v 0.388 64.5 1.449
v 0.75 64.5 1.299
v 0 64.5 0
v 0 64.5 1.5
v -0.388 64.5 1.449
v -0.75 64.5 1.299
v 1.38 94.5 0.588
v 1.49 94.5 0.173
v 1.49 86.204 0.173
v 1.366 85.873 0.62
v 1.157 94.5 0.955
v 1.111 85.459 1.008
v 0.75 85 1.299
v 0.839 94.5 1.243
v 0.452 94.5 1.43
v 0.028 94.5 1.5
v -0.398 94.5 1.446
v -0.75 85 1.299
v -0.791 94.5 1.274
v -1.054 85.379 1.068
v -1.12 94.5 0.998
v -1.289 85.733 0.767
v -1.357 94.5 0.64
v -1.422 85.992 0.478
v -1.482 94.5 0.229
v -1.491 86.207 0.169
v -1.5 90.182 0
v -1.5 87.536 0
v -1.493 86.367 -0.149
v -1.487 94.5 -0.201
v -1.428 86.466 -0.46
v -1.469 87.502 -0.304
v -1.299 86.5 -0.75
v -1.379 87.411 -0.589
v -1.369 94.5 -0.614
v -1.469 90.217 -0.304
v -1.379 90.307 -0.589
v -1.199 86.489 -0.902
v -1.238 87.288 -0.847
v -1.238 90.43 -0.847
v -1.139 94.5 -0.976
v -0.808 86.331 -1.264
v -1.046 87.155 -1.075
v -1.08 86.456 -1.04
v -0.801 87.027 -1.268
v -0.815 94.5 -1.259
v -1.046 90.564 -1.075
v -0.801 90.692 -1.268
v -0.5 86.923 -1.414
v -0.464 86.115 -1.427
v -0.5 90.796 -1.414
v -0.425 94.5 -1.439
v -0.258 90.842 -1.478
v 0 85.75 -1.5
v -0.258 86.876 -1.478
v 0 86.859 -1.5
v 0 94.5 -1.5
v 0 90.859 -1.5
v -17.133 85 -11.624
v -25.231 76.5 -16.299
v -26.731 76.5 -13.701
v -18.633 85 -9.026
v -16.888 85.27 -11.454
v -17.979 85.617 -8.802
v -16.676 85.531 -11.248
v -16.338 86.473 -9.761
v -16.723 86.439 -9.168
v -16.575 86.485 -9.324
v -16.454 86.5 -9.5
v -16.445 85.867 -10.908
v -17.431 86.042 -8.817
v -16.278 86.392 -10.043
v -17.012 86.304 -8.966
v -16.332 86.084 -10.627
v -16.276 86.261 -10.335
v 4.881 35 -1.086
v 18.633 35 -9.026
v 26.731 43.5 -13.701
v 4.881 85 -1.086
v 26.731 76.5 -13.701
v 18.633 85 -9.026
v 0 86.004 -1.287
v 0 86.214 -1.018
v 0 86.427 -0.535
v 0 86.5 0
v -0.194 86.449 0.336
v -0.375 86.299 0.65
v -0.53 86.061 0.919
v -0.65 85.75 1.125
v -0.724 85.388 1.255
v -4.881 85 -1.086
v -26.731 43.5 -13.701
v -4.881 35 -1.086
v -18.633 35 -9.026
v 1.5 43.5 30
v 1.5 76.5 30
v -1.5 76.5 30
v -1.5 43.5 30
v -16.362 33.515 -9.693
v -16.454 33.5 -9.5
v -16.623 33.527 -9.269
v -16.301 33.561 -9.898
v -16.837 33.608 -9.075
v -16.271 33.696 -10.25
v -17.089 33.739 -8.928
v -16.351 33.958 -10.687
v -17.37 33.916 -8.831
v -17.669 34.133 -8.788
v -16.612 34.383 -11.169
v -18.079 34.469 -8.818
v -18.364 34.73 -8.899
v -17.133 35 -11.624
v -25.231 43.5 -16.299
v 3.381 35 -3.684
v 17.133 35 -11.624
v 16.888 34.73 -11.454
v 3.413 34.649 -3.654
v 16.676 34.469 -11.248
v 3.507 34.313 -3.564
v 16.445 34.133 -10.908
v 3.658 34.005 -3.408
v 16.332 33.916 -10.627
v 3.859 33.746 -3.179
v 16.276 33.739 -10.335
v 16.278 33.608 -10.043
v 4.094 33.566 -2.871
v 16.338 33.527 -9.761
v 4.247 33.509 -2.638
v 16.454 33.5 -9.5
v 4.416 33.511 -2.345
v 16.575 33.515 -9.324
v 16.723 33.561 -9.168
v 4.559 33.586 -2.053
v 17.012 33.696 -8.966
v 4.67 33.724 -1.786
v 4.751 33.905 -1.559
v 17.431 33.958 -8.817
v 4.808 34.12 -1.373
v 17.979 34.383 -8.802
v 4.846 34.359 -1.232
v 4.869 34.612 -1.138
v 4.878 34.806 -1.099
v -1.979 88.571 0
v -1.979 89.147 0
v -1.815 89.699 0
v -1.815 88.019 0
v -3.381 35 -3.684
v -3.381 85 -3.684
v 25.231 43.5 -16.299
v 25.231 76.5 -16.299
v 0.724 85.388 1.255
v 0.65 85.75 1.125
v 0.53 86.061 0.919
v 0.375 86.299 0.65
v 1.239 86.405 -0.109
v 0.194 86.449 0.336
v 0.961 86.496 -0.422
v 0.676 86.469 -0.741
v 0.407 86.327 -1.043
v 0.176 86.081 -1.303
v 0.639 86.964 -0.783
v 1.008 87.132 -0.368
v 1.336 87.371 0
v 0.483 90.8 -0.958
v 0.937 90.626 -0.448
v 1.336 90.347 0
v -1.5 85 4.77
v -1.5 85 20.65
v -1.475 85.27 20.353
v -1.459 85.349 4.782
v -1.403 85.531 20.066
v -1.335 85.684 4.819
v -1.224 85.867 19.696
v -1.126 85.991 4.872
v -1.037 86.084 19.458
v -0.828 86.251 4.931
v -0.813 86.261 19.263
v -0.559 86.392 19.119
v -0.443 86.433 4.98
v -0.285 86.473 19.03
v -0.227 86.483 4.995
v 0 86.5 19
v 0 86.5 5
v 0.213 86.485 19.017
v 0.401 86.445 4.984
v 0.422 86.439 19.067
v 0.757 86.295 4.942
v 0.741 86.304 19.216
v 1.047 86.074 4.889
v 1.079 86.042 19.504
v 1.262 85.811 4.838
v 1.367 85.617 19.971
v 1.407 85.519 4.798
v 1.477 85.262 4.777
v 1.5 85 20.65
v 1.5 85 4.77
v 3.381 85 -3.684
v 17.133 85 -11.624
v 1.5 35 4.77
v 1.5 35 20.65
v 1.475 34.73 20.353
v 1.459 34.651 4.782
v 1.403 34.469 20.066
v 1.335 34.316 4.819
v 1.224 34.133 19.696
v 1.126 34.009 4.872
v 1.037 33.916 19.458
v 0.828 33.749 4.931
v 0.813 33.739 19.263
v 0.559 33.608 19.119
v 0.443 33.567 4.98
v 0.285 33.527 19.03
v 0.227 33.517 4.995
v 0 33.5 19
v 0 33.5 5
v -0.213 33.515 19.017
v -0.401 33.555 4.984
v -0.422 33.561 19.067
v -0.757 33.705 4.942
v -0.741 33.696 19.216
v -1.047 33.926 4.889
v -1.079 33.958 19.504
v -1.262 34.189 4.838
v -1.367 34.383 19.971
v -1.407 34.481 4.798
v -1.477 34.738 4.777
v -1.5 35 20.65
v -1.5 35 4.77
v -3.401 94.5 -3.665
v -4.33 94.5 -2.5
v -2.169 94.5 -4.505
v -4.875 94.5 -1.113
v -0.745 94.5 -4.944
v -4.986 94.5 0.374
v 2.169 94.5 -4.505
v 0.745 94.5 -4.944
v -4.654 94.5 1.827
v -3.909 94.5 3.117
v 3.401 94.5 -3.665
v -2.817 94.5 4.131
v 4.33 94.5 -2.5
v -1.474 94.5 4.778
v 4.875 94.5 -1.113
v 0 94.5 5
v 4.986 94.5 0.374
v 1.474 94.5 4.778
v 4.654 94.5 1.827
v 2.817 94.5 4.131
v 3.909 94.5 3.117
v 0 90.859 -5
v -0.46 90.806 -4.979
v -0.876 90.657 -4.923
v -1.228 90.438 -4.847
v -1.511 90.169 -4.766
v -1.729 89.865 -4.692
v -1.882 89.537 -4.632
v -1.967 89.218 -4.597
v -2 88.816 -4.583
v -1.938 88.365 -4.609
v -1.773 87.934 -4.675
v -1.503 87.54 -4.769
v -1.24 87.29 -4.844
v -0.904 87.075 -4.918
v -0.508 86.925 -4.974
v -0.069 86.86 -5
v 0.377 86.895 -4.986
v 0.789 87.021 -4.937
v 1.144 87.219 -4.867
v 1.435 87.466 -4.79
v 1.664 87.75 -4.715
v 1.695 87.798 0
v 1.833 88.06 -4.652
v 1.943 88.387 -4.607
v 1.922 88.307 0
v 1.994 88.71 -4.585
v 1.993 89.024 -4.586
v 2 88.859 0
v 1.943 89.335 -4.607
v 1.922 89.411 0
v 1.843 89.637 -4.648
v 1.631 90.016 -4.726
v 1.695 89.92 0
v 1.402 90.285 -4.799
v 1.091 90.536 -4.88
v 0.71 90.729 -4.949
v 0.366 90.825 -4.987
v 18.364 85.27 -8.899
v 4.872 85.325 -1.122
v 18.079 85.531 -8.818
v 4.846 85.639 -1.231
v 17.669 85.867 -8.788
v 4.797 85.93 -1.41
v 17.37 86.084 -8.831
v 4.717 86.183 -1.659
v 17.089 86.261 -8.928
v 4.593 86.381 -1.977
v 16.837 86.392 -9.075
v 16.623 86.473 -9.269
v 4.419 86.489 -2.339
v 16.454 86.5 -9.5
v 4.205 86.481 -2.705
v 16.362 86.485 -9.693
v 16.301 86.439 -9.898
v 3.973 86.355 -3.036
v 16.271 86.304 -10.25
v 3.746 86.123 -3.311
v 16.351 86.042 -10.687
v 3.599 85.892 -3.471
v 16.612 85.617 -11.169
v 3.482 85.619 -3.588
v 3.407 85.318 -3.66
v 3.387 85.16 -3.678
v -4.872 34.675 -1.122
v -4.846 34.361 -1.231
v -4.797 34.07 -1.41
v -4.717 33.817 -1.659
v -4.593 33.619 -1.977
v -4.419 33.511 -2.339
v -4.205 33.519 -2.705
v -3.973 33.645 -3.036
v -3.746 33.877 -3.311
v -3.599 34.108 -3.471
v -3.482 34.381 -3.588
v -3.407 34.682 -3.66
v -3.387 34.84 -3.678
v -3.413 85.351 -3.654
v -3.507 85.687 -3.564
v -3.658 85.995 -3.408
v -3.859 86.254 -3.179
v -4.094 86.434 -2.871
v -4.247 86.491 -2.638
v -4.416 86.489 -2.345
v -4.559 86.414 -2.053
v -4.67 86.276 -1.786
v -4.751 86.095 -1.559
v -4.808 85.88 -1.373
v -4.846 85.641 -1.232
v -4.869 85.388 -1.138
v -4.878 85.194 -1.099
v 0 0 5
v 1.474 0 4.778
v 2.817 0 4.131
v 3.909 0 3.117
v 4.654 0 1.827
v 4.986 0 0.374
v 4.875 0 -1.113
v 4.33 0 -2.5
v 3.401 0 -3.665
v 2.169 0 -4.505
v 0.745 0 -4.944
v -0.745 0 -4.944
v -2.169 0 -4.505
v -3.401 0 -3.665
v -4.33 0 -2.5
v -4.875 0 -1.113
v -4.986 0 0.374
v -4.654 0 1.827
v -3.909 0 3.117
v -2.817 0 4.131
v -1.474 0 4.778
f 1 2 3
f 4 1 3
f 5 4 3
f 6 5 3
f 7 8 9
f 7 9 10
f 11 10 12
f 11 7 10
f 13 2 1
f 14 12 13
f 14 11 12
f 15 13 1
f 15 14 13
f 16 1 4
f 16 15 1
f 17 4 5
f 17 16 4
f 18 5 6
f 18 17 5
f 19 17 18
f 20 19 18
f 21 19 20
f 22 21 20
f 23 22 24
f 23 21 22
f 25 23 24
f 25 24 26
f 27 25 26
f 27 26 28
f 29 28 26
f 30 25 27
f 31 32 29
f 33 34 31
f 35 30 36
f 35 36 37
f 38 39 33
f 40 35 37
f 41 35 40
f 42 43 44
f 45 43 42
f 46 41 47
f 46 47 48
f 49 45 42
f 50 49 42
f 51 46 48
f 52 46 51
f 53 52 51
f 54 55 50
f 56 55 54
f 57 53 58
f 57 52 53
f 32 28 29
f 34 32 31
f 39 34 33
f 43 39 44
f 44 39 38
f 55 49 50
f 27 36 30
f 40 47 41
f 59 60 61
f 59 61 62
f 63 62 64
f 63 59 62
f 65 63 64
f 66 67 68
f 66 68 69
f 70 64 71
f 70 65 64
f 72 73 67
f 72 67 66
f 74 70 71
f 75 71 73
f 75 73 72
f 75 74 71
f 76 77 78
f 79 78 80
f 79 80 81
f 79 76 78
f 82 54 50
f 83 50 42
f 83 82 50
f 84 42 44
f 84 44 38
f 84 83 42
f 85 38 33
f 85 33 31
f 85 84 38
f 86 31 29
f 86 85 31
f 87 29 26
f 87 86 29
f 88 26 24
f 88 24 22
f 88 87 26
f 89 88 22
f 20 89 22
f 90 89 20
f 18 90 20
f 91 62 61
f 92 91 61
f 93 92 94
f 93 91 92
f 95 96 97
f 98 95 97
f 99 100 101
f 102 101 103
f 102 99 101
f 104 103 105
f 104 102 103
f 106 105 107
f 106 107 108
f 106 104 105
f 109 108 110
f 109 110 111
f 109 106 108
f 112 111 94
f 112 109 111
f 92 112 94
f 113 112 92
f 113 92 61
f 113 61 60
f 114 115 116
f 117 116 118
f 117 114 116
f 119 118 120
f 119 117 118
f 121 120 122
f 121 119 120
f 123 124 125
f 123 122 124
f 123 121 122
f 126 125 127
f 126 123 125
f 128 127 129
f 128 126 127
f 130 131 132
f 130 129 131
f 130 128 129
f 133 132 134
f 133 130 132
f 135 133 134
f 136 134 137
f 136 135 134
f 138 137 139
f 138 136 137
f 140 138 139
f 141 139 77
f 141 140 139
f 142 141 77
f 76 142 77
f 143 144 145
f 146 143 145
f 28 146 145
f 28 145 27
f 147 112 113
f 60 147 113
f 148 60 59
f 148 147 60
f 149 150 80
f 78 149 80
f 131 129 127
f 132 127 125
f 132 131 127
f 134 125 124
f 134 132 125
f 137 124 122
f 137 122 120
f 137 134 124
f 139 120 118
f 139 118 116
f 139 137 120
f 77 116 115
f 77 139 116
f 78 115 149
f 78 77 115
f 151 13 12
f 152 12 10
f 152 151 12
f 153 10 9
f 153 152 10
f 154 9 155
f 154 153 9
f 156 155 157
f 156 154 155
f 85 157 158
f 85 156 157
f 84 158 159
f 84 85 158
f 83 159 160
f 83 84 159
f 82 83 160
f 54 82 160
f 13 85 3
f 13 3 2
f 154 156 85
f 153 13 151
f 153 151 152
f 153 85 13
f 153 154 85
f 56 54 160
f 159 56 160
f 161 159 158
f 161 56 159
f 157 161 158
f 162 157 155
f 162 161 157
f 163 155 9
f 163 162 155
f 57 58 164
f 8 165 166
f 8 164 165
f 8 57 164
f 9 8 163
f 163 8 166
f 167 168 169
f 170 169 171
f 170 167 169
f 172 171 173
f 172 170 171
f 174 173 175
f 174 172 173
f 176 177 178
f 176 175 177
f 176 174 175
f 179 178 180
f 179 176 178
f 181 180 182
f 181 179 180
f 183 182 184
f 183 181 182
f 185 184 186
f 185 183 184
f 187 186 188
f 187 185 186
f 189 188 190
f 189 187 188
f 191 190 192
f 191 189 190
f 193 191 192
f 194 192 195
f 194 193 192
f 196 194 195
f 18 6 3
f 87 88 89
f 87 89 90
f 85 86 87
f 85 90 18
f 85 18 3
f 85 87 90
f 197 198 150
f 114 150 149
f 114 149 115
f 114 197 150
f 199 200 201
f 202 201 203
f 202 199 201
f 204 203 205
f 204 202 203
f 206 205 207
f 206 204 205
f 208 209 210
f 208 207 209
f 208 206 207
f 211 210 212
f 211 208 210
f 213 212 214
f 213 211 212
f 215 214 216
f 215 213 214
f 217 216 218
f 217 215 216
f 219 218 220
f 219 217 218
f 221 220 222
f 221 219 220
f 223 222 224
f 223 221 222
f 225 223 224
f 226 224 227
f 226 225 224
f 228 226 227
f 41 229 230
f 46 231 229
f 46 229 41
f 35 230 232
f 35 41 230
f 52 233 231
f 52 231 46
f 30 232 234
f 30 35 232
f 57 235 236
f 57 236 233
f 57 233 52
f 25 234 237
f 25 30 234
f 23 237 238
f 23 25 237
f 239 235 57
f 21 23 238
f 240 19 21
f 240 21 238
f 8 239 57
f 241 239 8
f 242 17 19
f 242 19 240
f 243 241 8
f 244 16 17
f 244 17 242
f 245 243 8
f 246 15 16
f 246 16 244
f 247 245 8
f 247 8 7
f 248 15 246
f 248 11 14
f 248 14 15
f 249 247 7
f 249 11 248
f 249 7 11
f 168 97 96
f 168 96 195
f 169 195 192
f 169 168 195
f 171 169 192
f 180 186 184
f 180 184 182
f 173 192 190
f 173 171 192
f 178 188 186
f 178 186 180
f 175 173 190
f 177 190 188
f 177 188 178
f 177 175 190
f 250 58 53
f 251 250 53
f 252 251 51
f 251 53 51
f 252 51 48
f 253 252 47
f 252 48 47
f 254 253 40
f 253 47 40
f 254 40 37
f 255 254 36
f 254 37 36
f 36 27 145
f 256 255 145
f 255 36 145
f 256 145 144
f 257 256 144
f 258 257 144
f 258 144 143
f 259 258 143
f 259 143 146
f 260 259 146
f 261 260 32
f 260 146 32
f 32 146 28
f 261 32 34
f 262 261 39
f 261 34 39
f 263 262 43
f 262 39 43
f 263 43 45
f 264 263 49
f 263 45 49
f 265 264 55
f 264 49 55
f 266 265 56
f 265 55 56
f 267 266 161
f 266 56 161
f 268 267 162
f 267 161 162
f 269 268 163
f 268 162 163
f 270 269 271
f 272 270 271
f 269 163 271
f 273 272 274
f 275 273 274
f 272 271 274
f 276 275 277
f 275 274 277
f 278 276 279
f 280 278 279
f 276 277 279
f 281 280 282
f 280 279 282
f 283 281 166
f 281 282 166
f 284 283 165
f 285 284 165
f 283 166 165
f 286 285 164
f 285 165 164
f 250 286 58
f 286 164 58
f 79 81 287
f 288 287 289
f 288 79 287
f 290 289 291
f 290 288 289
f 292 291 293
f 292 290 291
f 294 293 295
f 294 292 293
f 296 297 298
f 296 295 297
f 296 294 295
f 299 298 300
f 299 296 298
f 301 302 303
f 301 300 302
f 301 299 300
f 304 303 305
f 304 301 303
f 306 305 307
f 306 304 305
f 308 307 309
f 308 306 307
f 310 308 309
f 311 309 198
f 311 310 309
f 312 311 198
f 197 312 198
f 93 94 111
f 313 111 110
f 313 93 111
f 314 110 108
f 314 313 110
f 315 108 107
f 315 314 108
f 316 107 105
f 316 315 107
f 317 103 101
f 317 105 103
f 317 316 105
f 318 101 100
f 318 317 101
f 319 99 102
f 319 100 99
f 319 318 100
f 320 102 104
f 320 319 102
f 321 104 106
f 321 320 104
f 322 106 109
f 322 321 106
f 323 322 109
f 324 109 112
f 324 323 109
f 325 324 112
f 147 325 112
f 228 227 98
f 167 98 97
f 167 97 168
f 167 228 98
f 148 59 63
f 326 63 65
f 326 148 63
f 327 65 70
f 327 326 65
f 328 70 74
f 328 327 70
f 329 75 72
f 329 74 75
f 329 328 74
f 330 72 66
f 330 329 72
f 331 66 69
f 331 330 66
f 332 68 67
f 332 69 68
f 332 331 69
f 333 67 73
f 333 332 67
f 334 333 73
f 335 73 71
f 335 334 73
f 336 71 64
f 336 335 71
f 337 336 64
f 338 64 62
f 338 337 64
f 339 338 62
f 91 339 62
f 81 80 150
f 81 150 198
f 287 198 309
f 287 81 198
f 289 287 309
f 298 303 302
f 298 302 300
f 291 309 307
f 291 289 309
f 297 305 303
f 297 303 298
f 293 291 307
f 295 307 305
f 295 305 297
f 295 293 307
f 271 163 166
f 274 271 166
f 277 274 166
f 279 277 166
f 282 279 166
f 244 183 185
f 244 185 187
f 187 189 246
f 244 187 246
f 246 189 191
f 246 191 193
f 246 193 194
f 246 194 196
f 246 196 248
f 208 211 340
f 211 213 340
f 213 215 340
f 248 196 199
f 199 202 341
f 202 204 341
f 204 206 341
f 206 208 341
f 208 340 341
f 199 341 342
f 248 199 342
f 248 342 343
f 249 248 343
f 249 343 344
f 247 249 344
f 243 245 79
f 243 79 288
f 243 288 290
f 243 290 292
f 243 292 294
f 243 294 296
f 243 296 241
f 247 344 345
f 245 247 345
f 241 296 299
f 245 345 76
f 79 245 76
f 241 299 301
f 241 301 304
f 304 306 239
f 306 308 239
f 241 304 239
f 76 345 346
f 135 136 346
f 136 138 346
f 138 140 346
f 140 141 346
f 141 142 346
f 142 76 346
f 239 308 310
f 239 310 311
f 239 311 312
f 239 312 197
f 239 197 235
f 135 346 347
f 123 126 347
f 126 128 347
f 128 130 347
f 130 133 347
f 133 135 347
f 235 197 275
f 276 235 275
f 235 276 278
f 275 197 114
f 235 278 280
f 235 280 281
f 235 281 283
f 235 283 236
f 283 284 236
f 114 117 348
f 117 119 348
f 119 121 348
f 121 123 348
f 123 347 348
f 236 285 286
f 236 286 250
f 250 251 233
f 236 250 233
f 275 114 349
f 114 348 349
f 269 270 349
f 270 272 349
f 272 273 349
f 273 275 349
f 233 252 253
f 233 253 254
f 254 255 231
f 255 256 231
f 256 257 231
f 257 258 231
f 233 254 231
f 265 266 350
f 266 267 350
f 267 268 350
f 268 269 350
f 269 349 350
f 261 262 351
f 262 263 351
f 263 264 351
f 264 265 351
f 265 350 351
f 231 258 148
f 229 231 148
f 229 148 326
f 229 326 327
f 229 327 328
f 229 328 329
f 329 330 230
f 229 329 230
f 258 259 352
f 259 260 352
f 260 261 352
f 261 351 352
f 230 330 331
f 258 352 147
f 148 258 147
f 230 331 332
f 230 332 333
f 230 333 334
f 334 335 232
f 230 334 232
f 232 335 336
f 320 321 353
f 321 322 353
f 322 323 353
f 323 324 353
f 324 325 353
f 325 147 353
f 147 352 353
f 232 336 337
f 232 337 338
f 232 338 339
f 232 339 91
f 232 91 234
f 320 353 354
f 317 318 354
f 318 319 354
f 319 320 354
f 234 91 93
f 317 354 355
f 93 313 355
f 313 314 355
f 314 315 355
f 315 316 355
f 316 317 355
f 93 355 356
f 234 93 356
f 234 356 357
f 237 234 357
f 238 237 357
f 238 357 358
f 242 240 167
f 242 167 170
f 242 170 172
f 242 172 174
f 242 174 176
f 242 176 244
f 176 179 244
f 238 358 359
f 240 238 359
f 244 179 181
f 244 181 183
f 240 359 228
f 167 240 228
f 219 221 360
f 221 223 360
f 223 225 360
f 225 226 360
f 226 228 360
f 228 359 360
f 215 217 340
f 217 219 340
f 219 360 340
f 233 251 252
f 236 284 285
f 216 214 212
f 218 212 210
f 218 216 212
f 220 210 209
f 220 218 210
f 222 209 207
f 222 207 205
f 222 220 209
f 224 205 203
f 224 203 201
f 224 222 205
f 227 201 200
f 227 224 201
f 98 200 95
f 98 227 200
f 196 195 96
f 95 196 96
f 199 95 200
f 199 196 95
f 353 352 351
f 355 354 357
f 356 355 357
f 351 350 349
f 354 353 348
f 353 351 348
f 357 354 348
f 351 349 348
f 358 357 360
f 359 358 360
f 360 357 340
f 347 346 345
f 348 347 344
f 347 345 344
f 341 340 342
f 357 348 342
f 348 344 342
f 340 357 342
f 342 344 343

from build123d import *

# Parameters (mm, degrees)
SKETCH2_R           = 5
BOSS_EXTRUDE1_DEPTH = 94.5
BOSS_EXTRUDE2_DEPTH = 30
CUT_EXTRUDE5_REACH  = 101.36
CUT_EXTRUDE1_DEPTH  = 30
SKETCH7_R           = 2
CUT_EXTRUDE2_DEPTH  = 10
CIRPATTERN1_COUNT   = 3
CUT_EXTRUDE6_REACH  = 104.514
CUT_EXTRUDE7_REACH  = 105.272


with BuildPart() as part:
    # Sketch2 → Boss-Extrude1 (new body)
    with BuildSketch(Plane(origin=(0, 0, 0), x_dir=(1, 0, 0), z_dir=(0, 1, 0))):
        Circle(SKETCH2_R)
    extrude(amount=BOSS_EXTRUDE1_DEPTH)

    # Sketch3 → Boss-Extrude2 (add)
    with BuildSketch(Plane.XY):
        with BuildLine():
            Line((1.5, 85), (1.5, 35))
            ThreePointArc((1.5, 35), (0, 33.5), (-1.5, 35))
            Line((-1.5, 35), (-1.5, 85))
            ThreePointArc((-1.5, 85), (0, 86.5), (1.5, 85))
        make_face()
    boss_extrude2 = extrude(amount=BOSS_EXTRUDE2_DEPTH)

    # Sketch12 → Cut-Extrude5 (cut, up to next)
    with BuildSketch(Plane.ZY.offset(1.5), mode=Mode.PRIVATE) as cut_extrude5_sk1:
        Polygon((30, 86.5), (30, 76.5), (19, 86.5), align=None)
    cut_extrude5_tool1 = extrude(cut_extrude5_sk1.sketch, amount=-CUT_EXTRUDE5_REACH, mode=Mode.PRIVATE) & part.part
    # Sketch12 → Cut-Extrude5 (cut, up to next)
    with BuildSketch(Plane.ZY.offset(1.5), mode=Mode.PRIVATE) as cut_extrude5_sk2:
        Polygon((30, 33.5), (19, 33.5), (30, 43.5), align=None)
    cut_extrude5_tool2 = extrude(cut_extrude5_sk2.sketch, amount=-CUT_EXTRUDE5_REACH, mode=Mode.PRIVATE) & part.part
    add(cut_extrude5_tool1.solids().sort_by_distance((-1.5, 83.166667, 26.333333))[0], mode=Mode.SUBTRACT)
    add(cut_extrude5_tool2.solids().sort_by_distance((-1.5, 36.833333, 26.333333))[0], mode=Mode.SUBTRACT)

    # Sketch6 → Cut-Extrude1 (cut)
    with BuildSketch(Plane(origin=(0, 94.5, 0), x_dir=(1, 0, 0), z_dir=(0, 1, 0))):
        with BuildLine():
            Line((0, 1.5), (1.490044378, -0.172533333))
            ThreePointArc((1.490044378, -0.172533333), (-1.12, -0.997797575), (0, 1.5))
        make_face()
    extrude(amount=-CUT_EXTRUDE1_DEPTH, mode=Mode.SUBTRACT)

    # Sketch7 → Cut-Extrude2 (cut)
    with BuildSketch(Plane.XY):
        with Locations((0, 88.859096579)):
            Circle(SKETCH7_R)
    extrude(amount=-CUT_EXTRUDE2_DEPTH, mode=Mode.SUBTRACT)

    # CirPattern1: Boss-Extrude2 ×3 about axis
    cirpattern1_axis = Axis((0, 94.5, 0), (0, -1, 0))
    for i in range(1, CIRPATTERN1_COUNT):
        add(boss_extrude2.rotate(cirpattern1_axis, i * 360 / CIRPATTERN1_COUNT))

    # Sketch13 → Cut-Extrude6 (cut, up to next)
    with BuildSketch(Plane(origin=(0.75, 0, 1.299038106), x_dir=(0.8660254037844431, 0, -0.499999999999992), z_dir=(0.49999999999999206, 0, 0.8660254037844433)), mode=Mode.PRIVATE) as cut_extrude6_sk1:
        Polygon((30, 86.5), (30, 76.5), (19, 86.5), align=None)
    cut_extrude6_tool1 = extrude(cut_extrude6_sk1.sketch, amount=-CUT_EXTRUDE6_REACH, mode=Mode.PRIVATE) & part.part
    # Sketch13 → Cut-Extrude6 (cut, up to next)
    with BuildSketch(Plane(origin=(0.75, 0, 1.299038106), x_dir=(0.8660254037844431, 0, -0.499999999999992), z_dir=(0.49999999999999206, 0, 0.8660254037844433)), mode=Mode.PRIVATE) as cut_extrude6_sk2:
        Polygon((30, 33.5), (19, 33.5), (30, 43.5), align=None)
    cut_extrude6_tool2 = extrude(cut_extrude6_sk2.sketch, amount=-CUT_EXTRUDE6_REACH, mode=Mode.PRIVATE) & part.part
    add(cut_extrude6_tool1.solids().sort_by_distance((23.555336, 83.166667, -11.867629))[0], mode=Mode.SUBTRACT)
    add(cut_extrude6_tool2.solids().sort_by_distance((23.555336, 36.833333, -11.867629))[0], mode=Mode.SUBTRACT)

    # Sketch14 → Cut-Extrude7 (cut, up to next)
    with BuildSketch(Plane(origin=(0.75, 0, -1.299038106), x_dir=(-0.8660254037844363, 0, -0.5000000000000043), z_dir=(0.5000000000000042, 0, -0.8660254037844362)), mode=Mode.PRIVATE) as cut_extrude7_sk1:
        Polygon((30, 86.5), (30, 76.5), (19, 86.5), align=None)
    cut_extrude7_tool1 = extrude(cut_extrude7_sk1.sketch, amount=-CUT_EXTRUDE7_REACH, mode=Mode.PRIVATE) & part.part
    # Sketch14 → Cut-Extrude7 (cut, up to next)
    with BuildSketch(Plane(origin=(0.75, 0, -1.299038106), x_dir=(-0.8660254037844363, 0, -0.5000000000000043), z_dir=(0.5000000000000042, 0, -0.8660254037844362)), mode=Mode.PRIVATE) as cut_extrude7_sk2:
        Polygon((30, 33.5), (19, 33.5), (30, 43.5), align=None)
    cut_extrude7_tool2 = extrude(cut_extrude7_sk2.sketch, amount=-CUT_EXTRUDE7_REACH, mode=Mode.PRIVATE) & part.part
    add(cut_extrude7_tool1.solids().sort_by_distance((-22.055336, 83.166667, -14.465705))[0], mode=Mode.SUBTRACT)
    add(cut_extrude7_tool2.solids().sort_by_distance((-22.055336, 36.833333, -14.465705))[0], mode=Mode.SUBTRACT)


solid = part.part
